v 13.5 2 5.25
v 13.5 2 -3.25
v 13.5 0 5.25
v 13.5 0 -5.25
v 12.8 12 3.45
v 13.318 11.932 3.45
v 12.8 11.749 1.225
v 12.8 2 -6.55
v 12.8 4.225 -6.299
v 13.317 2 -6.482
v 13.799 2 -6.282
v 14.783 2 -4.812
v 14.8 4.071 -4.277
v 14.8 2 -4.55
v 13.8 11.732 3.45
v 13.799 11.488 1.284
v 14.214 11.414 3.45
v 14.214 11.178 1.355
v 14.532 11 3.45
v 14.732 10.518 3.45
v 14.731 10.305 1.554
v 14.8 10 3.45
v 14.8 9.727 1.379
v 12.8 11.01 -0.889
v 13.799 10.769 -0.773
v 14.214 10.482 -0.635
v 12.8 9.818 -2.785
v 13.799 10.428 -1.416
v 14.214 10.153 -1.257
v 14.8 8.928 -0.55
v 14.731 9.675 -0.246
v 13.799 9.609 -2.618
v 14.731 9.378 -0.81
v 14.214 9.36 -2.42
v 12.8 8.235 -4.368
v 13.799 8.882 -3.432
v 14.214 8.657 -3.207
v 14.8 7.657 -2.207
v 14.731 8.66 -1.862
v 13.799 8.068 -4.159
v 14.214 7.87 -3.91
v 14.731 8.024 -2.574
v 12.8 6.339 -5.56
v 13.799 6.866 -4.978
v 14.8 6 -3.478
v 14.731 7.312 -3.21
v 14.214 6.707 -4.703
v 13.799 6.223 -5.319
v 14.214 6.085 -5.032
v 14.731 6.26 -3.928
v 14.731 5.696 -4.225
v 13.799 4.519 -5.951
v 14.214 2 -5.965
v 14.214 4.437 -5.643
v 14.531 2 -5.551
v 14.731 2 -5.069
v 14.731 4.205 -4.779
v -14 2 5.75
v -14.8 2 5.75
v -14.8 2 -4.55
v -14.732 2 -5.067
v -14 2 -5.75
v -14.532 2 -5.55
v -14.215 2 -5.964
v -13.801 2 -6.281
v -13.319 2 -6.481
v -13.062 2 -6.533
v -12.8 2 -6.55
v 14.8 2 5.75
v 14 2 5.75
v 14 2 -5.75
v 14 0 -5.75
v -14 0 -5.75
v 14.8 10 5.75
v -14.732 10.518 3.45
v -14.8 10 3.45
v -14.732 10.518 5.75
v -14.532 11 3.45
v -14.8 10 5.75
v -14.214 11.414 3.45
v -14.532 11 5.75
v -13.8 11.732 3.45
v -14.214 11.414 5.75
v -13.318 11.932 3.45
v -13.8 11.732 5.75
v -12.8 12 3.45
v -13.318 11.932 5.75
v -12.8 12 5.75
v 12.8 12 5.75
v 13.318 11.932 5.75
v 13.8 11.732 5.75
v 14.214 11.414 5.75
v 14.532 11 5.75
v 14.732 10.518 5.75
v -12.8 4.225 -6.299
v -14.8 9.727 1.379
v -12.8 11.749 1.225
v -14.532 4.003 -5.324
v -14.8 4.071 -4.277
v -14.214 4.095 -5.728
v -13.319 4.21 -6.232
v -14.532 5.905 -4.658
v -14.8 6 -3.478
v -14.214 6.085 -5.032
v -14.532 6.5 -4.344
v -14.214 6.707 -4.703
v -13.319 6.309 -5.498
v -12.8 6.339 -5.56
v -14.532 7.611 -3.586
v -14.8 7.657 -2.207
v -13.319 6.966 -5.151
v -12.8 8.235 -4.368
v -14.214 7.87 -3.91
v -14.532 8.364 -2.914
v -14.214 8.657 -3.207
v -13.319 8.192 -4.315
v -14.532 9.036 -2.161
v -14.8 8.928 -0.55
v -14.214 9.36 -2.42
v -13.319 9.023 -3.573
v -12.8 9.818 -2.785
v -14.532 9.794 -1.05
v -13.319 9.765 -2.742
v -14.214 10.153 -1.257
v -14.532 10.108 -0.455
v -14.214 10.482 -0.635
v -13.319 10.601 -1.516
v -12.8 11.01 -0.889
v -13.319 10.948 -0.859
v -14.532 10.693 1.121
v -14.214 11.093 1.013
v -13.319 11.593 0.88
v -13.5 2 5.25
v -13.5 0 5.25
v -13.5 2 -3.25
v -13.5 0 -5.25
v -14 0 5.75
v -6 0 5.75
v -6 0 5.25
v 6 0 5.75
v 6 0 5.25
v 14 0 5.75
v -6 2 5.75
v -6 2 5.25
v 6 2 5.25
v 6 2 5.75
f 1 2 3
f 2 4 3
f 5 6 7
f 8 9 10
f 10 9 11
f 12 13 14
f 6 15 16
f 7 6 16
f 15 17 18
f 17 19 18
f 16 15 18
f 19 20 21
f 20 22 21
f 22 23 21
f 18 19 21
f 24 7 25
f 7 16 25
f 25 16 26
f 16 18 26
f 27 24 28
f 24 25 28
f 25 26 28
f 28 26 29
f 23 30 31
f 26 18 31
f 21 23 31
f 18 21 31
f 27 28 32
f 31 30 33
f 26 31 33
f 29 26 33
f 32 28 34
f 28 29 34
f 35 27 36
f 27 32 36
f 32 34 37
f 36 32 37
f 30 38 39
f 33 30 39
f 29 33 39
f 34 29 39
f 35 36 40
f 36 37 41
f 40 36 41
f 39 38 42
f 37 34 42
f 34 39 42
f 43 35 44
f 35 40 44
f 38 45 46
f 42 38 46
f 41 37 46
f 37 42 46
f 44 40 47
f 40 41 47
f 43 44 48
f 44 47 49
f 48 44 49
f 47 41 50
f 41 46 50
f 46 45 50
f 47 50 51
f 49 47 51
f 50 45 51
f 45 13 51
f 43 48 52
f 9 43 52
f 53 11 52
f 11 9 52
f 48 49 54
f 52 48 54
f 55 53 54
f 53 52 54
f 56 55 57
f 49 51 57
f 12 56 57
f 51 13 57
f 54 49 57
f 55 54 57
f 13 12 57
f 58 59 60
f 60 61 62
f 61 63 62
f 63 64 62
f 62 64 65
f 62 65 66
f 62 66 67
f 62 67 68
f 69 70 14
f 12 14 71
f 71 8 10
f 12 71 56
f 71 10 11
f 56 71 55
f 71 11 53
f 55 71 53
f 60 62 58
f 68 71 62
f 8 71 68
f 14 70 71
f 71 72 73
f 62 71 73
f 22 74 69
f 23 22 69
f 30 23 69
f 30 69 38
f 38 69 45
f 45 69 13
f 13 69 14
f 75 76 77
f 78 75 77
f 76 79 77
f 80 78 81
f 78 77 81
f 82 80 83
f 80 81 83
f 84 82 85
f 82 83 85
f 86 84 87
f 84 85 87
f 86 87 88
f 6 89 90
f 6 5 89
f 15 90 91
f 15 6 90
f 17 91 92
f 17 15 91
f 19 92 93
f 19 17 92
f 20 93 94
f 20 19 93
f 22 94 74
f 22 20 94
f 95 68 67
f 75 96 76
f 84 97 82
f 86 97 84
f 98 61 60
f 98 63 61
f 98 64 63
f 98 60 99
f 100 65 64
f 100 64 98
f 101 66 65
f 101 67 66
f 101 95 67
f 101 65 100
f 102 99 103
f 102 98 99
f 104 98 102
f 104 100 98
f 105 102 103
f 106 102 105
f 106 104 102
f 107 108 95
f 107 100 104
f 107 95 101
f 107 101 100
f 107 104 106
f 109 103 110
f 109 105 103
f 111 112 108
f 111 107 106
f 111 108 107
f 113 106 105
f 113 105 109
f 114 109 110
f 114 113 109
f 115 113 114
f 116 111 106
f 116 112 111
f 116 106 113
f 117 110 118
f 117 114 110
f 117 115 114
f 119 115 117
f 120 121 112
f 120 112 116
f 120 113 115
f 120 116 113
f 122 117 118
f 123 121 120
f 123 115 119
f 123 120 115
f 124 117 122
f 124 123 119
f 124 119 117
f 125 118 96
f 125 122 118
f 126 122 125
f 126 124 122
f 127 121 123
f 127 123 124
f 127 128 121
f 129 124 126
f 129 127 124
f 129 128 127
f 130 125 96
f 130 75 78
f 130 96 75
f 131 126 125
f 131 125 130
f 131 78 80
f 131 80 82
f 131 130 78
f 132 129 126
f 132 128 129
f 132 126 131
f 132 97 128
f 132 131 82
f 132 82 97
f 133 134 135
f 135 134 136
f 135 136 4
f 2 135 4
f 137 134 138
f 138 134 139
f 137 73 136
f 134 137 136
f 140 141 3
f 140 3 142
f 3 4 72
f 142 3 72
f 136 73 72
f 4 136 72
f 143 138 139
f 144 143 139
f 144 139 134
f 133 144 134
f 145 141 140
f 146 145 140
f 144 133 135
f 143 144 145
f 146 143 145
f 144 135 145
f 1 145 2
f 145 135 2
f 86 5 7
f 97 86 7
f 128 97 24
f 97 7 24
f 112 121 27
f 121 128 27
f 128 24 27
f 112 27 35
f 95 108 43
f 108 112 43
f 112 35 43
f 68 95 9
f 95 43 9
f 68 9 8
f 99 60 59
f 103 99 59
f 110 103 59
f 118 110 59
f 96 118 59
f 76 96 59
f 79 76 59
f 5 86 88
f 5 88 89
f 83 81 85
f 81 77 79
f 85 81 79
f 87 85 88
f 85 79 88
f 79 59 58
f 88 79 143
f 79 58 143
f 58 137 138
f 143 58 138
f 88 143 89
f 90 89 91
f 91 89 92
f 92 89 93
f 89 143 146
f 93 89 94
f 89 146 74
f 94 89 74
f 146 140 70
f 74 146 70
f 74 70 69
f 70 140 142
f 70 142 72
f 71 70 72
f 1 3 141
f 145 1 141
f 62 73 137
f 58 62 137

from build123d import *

# Parameters (mm, degrees)
BOSS_EXTRUDE1_DEPTH = 2
BOSS_EXTRUDE2_DEPTH = 10
CUT_EXTRUDE1_REACH  = 34.605
FILLET1_R           = 2
CHAMFER1_SIZE       = 2


with BuildPart() as part:
    # Sketch1 → Boss-Extrude1 (new body)
    with BuildSketch(Plane(origin=(0, 0, 0), x_dir=(1, 0, 0), z_dir=(0, 1, 0))):
        Polygon((14, 5.75), (-14, 5.75), (-14, -5.75), (-6, -5.75), (-6, -5.25), (-13.5, -5.25), (-13.5, 5.25), (13.5, 5.25), (13.5, -5.25), (6, -5.25), (6, -5.75), (14, -5.75), align=None)
    extrude(amount=BOSS_EXTRUDE1_DEPTH)

    # Sketch2 → Boss-Extrude2 (add)
    with BuildSketch(Plane(origin=(0, 2, 0), x_dir=(1, 0, 0), z_dir=(0, 1, 0))):
        Polygon((-14.8, 6.55), (-14.8, -5.75), (-14, -5.75), (-14, 5.75), (14, 5.75), (14, -5.75), (14.8, -5.75), (14.8, 6.55), align=None)
        Polygon((-14, 5.75), (-14, -5.75), (-6, -5.75), (-6, -5.25), (-13.5, -5.25), (-13.5, 5.25), (13.5, 5.25), (13.5, -5.25), (6, -5.25), (6, -5.75), (14, -5.75), (14, 5.75), align=None)
        Polygon((-6, -5.75), (-5.2, -5.75), (-5.2, -4.45), (-12.7, -4.45), (-12.7, 4.45), (12.7, 4.45), (12.7, -4.45), (5.2, -4.45), (5.2, -5.75), (6, -5.75), (6, -5.25), (13.5, -5.25), (13.5, 5.25), (-13.5, 5.25), (-13.5, -5.25), (-6, -5.25), align=None)
        Polygon((-5.2, -4.45), (-5.2, -5.75), (5.2, -5.75), (5.2, -4.45), (12.7, -4.45), (12.7, 4.45), (-12.7, 4.45), (-12.7, -4.45), align=None)
    extrude(amount=BOSS_EXTRUDE2_DEPTH)

    # Sketch3 → Cut-Extrude1 (cut, up to next)
    with BuildSketch(Plane(origin=(14.8, 0, 0), x_dir=(0, 0, -1), z_dir=(1, 0, 0)), mode=Mode.PRIVATE) as cut_extrude1_sk1:
        with BuildLine():
            Line((6.55, 12), (-3.45, 12))
            ThreePointArc((-3.45, 12), (3.621067812, 9.071067812), (6.55, 2))
            Line((6.55, 2), (6.55, 12))
        make_face()
    cut_extrude1_tool1 = extrude(cut_extrude1_sk1.sketch, amount=-CUT_EXTRUDE1_REACH, mode=Mode.PRIVATE) & part.part
    add(cut_extrude1_tool1.solids().sort_by_distance((14.8, 9.766321, -4.316321))[0], mode=Mode.SUBTRACT)

    # Fillet1
    fillet1_edges = [part.edges().sort_by_distance(p)[0] for p in [
        (14.8, 12, 4.6),
        (-14.8, 12, 4.6),
        (14.8, 9.071067812, -3.621067812),
        (-14.8, 9.071067812, -3.621067812),
    ]]
    fillet(fillet1_edges, radius=FILLET1_R)

    # Chamfer1
    chamfer1_edges = [part.edges().sort_by_distance(p)[0] for p in [
        (0, 2, -5.25),
    ]]
    chamfer(chamfer1_edges, length=CHAMFER1_SIZE - 0.0001)  # a hair under: the kernel refuses the full size


solid = part.part
